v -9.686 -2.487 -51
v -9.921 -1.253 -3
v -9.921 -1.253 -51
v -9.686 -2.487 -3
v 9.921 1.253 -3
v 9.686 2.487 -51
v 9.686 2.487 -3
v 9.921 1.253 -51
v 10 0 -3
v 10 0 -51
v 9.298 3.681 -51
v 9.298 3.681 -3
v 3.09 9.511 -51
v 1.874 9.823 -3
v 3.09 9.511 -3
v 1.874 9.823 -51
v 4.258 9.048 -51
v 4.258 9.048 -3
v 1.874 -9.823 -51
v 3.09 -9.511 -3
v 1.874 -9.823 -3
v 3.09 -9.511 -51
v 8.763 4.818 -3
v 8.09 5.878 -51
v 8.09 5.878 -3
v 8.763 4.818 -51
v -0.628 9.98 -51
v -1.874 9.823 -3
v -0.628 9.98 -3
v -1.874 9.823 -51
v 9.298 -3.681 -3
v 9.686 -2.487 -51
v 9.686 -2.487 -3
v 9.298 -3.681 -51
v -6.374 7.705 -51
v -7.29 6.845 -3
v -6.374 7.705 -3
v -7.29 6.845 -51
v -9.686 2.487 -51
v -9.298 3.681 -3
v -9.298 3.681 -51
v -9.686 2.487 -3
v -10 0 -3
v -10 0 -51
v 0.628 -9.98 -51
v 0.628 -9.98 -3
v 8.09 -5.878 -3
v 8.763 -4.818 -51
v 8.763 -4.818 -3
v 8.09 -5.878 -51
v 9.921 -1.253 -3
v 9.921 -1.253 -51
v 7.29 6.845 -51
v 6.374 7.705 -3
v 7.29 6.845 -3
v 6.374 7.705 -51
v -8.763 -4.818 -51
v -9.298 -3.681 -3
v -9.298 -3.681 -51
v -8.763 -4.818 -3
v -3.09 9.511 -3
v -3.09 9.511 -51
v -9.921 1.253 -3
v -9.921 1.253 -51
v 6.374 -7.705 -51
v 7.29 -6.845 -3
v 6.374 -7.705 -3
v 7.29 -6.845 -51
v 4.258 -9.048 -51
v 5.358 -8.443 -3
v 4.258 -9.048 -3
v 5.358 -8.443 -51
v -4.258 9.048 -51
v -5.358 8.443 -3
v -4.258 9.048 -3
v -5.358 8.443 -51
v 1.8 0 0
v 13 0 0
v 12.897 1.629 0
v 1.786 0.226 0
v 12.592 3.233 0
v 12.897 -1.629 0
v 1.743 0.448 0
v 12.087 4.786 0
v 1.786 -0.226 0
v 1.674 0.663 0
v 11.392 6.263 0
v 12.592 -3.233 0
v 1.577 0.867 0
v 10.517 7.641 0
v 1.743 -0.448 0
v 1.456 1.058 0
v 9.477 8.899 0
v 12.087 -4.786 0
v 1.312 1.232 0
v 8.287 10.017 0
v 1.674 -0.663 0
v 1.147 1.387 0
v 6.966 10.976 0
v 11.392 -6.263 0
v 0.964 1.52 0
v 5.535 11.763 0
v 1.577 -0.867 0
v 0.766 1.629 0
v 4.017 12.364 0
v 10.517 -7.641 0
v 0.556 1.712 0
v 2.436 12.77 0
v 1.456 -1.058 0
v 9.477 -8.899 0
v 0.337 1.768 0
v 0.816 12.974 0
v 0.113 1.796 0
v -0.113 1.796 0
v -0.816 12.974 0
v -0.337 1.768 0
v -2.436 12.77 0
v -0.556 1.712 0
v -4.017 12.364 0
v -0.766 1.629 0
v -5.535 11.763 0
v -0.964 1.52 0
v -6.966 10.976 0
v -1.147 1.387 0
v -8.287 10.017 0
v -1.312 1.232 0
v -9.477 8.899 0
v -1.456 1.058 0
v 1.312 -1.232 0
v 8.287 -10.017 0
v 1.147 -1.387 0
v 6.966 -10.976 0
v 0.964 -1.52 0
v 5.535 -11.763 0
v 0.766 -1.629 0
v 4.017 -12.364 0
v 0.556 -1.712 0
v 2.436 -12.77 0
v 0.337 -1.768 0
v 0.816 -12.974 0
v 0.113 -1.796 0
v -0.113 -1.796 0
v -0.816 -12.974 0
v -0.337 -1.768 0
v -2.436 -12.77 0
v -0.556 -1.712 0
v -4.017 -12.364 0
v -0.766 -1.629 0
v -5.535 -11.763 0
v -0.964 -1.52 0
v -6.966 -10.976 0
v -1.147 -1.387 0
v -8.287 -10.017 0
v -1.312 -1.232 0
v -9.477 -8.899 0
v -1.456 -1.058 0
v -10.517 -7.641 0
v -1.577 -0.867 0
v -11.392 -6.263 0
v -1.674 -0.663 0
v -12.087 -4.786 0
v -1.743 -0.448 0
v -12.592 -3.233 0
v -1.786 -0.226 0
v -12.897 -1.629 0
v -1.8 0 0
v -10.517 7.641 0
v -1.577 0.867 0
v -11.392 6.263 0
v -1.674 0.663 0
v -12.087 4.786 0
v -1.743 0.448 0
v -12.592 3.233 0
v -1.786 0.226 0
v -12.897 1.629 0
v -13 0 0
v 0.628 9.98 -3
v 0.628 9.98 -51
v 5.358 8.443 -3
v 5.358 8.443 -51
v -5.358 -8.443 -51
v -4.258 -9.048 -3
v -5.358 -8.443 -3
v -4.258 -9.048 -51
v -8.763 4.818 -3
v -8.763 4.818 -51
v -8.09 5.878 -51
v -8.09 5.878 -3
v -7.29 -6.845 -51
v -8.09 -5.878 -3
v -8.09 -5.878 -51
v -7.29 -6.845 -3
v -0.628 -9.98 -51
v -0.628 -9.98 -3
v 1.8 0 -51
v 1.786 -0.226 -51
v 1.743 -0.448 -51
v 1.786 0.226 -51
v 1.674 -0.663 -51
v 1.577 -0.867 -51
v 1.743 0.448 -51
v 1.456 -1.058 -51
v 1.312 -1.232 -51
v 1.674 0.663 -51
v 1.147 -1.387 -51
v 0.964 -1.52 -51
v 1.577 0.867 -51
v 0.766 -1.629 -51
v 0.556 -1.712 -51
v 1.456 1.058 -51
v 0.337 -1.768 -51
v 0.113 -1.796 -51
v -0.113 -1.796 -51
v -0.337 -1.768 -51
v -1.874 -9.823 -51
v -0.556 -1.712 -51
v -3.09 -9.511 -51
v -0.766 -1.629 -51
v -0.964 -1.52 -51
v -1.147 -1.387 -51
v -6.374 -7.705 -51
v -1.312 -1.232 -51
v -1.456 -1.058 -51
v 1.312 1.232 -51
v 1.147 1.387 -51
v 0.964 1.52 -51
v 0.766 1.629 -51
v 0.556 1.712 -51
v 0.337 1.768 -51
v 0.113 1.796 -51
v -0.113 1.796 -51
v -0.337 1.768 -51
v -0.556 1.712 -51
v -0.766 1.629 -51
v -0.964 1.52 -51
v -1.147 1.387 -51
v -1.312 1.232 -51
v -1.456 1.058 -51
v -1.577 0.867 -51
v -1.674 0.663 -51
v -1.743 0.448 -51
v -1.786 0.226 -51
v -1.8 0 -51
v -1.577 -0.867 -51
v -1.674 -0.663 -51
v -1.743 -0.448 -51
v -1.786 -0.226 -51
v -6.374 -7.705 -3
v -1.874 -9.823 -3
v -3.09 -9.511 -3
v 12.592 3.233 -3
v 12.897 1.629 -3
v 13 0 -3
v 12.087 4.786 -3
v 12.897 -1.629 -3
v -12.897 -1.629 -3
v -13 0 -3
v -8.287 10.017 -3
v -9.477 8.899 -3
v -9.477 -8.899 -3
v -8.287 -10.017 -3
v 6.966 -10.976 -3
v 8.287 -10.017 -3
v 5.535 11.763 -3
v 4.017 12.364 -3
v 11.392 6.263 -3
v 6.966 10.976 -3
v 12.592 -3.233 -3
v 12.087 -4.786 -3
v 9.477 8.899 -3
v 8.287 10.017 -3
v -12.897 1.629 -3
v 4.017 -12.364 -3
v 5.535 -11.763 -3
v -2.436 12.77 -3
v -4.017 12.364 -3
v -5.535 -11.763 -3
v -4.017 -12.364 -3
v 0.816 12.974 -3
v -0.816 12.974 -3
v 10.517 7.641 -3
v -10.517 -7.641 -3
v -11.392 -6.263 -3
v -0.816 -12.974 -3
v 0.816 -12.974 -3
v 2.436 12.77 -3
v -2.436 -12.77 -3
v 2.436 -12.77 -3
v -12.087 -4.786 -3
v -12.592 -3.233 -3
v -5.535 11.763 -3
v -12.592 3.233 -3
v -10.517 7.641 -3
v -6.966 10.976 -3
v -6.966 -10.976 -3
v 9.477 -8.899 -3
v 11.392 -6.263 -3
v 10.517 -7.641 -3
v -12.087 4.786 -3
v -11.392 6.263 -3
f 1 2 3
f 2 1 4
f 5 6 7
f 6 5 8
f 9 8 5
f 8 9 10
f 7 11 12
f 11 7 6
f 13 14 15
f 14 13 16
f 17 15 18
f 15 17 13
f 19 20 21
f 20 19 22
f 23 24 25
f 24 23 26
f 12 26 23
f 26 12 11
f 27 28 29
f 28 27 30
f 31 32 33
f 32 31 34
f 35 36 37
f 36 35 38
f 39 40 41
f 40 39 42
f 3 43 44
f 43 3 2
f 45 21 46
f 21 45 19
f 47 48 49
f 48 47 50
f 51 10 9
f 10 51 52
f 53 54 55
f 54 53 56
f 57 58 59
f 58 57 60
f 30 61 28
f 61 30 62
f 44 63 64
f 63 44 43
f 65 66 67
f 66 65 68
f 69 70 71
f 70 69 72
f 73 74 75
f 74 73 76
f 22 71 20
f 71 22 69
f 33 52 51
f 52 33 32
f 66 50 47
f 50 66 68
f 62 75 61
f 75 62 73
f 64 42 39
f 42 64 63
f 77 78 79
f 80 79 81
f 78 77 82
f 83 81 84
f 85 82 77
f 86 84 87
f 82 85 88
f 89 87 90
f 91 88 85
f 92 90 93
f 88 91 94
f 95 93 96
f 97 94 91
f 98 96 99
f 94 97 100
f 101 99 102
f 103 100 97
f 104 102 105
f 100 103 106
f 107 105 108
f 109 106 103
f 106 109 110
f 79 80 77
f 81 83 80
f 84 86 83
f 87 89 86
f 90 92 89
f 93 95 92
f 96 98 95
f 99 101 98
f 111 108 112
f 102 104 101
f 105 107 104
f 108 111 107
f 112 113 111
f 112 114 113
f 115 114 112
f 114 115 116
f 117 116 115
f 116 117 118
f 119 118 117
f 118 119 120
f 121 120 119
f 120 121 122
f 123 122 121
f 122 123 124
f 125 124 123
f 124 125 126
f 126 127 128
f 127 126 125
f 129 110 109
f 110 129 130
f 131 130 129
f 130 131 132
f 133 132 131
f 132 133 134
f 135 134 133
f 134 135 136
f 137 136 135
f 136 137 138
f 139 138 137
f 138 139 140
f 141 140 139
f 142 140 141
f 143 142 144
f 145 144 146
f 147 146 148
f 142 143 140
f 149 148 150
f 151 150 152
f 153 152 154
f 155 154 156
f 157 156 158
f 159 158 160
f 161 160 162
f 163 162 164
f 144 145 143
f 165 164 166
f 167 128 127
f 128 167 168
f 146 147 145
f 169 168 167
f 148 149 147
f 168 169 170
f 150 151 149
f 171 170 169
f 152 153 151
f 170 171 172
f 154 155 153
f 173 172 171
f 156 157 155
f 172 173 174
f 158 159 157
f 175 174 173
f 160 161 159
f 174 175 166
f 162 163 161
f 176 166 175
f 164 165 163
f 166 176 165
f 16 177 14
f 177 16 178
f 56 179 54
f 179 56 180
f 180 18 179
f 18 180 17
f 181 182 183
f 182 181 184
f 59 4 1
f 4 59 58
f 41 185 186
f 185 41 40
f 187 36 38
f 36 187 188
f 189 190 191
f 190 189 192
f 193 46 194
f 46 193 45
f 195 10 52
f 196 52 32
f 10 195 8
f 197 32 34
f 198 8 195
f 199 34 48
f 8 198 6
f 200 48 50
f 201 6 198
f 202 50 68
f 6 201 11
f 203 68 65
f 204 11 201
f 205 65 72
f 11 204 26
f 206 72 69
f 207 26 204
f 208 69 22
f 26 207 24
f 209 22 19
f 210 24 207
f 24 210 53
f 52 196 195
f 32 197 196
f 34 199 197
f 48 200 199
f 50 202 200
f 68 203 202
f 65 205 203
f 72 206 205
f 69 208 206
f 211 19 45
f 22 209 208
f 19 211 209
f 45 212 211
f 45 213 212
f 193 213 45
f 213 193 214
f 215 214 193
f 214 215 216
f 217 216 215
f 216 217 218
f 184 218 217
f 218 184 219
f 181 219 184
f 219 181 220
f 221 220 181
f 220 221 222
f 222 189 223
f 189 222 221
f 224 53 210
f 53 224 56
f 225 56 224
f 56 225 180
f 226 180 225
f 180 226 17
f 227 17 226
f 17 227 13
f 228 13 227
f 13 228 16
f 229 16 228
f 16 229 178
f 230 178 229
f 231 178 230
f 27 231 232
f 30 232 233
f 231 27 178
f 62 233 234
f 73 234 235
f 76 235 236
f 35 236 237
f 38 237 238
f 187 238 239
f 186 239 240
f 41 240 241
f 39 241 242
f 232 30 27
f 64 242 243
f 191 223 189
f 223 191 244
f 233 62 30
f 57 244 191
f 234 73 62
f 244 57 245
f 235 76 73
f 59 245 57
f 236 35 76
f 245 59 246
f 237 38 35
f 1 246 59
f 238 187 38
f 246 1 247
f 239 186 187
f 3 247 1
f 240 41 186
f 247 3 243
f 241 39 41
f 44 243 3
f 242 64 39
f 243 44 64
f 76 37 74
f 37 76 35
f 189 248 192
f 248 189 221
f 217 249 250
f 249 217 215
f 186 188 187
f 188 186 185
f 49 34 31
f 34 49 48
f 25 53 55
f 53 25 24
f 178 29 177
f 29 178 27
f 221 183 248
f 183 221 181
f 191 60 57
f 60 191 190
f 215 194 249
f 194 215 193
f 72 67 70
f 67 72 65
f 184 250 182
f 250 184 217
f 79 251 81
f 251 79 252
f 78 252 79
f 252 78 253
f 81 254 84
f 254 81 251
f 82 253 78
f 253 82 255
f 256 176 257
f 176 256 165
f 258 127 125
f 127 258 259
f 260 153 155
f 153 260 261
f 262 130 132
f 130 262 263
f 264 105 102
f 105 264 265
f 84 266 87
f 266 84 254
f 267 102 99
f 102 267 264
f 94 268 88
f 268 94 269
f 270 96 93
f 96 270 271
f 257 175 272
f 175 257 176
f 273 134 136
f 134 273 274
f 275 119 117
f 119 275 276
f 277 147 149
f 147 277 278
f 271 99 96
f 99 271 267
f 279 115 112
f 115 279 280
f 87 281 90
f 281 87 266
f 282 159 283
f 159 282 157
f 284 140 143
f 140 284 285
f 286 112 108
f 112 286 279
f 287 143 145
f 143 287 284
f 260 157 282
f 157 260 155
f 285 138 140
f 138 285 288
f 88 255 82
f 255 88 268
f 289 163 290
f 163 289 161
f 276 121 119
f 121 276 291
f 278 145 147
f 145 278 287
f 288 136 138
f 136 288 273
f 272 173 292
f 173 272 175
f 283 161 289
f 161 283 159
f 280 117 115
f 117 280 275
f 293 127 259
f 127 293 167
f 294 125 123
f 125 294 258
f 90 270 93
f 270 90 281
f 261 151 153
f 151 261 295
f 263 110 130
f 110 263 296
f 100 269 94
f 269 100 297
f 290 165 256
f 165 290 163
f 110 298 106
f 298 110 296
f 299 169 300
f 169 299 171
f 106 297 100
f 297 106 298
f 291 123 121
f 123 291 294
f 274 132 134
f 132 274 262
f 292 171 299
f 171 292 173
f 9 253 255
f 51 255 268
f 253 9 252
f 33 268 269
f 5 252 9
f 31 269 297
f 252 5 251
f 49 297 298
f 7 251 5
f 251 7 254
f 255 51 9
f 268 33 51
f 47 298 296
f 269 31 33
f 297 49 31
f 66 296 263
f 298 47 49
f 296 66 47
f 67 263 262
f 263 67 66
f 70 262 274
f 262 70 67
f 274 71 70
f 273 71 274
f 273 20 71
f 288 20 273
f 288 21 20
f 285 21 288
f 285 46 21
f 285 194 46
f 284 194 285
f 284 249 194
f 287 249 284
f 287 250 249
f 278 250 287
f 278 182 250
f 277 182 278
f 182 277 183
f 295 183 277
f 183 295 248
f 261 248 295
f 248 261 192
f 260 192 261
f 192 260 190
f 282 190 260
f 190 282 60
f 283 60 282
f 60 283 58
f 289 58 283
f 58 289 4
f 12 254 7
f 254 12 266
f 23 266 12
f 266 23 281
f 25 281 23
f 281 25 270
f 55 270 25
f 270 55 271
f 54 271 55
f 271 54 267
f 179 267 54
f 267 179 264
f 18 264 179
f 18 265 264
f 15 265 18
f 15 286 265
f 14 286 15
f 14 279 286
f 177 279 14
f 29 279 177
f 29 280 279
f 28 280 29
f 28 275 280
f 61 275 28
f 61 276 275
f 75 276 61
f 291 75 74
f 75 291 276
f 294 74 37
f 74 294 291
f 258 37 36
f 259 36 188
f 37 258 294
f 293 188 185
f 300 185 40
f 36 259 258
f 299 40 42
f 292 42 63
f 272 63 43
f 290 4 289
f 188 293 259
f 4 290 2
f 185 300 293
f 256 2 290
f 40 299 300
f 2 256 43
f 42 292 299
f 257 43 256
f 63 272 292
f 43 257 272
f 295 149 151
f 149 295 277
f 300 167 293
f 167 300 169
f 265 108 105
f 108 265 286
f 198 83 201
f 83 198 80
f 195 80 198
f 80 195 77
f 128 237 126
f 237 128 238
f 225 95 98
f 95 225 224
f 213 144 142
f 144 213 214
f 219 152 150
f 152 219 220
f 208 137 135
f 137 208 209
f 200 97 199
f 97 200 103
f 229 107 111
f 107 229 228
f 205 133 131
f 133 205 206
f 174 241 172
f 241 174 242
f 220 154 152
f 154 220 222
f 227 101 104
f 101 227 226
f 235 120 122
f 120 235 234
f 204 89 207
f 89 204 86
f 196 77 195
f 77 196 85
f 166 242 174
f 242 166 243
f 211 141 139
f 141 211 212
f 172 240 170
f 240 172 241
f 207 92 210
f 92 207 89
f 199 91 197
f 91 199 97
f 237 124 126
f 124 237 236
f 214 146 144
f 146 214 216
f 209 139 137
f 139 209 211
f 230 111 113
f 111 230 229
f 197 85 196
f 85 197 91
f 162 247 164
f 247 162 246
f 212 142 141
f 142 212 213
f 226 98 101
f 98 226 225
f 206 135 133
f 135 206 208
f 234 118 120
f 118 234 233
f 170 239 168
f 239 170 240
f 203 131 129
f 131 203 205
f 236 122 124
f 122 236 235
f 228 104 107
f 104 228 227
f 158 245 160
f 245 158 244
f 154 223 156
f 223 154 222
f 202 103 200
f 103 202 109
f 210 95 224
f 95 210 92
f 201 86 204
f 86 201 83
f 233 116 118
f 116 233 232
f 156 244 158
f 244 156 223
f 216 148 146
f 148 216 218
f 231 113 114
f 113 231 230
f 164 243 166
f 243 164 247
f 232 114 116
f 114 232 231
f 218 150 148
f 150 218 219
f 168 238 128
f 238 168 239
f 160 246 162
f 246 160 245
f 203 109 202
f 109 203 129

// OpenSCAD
$fn = 50;


difference() {
	union() {
		translate(v = [0, 0, -51.0000000000]) {
			cylinder(h = 51, r = 10.0000000000);
		}
		translate(v = [0, 0, -3.0000000000]) {
			cylinder(h = 3, r = 13.0000000000);
		}
	}
	union() {
		#translate(v = [0, 0, -51]) {
			cylinder(h = 51, r = 1.8000000000);
		}
	}
}
